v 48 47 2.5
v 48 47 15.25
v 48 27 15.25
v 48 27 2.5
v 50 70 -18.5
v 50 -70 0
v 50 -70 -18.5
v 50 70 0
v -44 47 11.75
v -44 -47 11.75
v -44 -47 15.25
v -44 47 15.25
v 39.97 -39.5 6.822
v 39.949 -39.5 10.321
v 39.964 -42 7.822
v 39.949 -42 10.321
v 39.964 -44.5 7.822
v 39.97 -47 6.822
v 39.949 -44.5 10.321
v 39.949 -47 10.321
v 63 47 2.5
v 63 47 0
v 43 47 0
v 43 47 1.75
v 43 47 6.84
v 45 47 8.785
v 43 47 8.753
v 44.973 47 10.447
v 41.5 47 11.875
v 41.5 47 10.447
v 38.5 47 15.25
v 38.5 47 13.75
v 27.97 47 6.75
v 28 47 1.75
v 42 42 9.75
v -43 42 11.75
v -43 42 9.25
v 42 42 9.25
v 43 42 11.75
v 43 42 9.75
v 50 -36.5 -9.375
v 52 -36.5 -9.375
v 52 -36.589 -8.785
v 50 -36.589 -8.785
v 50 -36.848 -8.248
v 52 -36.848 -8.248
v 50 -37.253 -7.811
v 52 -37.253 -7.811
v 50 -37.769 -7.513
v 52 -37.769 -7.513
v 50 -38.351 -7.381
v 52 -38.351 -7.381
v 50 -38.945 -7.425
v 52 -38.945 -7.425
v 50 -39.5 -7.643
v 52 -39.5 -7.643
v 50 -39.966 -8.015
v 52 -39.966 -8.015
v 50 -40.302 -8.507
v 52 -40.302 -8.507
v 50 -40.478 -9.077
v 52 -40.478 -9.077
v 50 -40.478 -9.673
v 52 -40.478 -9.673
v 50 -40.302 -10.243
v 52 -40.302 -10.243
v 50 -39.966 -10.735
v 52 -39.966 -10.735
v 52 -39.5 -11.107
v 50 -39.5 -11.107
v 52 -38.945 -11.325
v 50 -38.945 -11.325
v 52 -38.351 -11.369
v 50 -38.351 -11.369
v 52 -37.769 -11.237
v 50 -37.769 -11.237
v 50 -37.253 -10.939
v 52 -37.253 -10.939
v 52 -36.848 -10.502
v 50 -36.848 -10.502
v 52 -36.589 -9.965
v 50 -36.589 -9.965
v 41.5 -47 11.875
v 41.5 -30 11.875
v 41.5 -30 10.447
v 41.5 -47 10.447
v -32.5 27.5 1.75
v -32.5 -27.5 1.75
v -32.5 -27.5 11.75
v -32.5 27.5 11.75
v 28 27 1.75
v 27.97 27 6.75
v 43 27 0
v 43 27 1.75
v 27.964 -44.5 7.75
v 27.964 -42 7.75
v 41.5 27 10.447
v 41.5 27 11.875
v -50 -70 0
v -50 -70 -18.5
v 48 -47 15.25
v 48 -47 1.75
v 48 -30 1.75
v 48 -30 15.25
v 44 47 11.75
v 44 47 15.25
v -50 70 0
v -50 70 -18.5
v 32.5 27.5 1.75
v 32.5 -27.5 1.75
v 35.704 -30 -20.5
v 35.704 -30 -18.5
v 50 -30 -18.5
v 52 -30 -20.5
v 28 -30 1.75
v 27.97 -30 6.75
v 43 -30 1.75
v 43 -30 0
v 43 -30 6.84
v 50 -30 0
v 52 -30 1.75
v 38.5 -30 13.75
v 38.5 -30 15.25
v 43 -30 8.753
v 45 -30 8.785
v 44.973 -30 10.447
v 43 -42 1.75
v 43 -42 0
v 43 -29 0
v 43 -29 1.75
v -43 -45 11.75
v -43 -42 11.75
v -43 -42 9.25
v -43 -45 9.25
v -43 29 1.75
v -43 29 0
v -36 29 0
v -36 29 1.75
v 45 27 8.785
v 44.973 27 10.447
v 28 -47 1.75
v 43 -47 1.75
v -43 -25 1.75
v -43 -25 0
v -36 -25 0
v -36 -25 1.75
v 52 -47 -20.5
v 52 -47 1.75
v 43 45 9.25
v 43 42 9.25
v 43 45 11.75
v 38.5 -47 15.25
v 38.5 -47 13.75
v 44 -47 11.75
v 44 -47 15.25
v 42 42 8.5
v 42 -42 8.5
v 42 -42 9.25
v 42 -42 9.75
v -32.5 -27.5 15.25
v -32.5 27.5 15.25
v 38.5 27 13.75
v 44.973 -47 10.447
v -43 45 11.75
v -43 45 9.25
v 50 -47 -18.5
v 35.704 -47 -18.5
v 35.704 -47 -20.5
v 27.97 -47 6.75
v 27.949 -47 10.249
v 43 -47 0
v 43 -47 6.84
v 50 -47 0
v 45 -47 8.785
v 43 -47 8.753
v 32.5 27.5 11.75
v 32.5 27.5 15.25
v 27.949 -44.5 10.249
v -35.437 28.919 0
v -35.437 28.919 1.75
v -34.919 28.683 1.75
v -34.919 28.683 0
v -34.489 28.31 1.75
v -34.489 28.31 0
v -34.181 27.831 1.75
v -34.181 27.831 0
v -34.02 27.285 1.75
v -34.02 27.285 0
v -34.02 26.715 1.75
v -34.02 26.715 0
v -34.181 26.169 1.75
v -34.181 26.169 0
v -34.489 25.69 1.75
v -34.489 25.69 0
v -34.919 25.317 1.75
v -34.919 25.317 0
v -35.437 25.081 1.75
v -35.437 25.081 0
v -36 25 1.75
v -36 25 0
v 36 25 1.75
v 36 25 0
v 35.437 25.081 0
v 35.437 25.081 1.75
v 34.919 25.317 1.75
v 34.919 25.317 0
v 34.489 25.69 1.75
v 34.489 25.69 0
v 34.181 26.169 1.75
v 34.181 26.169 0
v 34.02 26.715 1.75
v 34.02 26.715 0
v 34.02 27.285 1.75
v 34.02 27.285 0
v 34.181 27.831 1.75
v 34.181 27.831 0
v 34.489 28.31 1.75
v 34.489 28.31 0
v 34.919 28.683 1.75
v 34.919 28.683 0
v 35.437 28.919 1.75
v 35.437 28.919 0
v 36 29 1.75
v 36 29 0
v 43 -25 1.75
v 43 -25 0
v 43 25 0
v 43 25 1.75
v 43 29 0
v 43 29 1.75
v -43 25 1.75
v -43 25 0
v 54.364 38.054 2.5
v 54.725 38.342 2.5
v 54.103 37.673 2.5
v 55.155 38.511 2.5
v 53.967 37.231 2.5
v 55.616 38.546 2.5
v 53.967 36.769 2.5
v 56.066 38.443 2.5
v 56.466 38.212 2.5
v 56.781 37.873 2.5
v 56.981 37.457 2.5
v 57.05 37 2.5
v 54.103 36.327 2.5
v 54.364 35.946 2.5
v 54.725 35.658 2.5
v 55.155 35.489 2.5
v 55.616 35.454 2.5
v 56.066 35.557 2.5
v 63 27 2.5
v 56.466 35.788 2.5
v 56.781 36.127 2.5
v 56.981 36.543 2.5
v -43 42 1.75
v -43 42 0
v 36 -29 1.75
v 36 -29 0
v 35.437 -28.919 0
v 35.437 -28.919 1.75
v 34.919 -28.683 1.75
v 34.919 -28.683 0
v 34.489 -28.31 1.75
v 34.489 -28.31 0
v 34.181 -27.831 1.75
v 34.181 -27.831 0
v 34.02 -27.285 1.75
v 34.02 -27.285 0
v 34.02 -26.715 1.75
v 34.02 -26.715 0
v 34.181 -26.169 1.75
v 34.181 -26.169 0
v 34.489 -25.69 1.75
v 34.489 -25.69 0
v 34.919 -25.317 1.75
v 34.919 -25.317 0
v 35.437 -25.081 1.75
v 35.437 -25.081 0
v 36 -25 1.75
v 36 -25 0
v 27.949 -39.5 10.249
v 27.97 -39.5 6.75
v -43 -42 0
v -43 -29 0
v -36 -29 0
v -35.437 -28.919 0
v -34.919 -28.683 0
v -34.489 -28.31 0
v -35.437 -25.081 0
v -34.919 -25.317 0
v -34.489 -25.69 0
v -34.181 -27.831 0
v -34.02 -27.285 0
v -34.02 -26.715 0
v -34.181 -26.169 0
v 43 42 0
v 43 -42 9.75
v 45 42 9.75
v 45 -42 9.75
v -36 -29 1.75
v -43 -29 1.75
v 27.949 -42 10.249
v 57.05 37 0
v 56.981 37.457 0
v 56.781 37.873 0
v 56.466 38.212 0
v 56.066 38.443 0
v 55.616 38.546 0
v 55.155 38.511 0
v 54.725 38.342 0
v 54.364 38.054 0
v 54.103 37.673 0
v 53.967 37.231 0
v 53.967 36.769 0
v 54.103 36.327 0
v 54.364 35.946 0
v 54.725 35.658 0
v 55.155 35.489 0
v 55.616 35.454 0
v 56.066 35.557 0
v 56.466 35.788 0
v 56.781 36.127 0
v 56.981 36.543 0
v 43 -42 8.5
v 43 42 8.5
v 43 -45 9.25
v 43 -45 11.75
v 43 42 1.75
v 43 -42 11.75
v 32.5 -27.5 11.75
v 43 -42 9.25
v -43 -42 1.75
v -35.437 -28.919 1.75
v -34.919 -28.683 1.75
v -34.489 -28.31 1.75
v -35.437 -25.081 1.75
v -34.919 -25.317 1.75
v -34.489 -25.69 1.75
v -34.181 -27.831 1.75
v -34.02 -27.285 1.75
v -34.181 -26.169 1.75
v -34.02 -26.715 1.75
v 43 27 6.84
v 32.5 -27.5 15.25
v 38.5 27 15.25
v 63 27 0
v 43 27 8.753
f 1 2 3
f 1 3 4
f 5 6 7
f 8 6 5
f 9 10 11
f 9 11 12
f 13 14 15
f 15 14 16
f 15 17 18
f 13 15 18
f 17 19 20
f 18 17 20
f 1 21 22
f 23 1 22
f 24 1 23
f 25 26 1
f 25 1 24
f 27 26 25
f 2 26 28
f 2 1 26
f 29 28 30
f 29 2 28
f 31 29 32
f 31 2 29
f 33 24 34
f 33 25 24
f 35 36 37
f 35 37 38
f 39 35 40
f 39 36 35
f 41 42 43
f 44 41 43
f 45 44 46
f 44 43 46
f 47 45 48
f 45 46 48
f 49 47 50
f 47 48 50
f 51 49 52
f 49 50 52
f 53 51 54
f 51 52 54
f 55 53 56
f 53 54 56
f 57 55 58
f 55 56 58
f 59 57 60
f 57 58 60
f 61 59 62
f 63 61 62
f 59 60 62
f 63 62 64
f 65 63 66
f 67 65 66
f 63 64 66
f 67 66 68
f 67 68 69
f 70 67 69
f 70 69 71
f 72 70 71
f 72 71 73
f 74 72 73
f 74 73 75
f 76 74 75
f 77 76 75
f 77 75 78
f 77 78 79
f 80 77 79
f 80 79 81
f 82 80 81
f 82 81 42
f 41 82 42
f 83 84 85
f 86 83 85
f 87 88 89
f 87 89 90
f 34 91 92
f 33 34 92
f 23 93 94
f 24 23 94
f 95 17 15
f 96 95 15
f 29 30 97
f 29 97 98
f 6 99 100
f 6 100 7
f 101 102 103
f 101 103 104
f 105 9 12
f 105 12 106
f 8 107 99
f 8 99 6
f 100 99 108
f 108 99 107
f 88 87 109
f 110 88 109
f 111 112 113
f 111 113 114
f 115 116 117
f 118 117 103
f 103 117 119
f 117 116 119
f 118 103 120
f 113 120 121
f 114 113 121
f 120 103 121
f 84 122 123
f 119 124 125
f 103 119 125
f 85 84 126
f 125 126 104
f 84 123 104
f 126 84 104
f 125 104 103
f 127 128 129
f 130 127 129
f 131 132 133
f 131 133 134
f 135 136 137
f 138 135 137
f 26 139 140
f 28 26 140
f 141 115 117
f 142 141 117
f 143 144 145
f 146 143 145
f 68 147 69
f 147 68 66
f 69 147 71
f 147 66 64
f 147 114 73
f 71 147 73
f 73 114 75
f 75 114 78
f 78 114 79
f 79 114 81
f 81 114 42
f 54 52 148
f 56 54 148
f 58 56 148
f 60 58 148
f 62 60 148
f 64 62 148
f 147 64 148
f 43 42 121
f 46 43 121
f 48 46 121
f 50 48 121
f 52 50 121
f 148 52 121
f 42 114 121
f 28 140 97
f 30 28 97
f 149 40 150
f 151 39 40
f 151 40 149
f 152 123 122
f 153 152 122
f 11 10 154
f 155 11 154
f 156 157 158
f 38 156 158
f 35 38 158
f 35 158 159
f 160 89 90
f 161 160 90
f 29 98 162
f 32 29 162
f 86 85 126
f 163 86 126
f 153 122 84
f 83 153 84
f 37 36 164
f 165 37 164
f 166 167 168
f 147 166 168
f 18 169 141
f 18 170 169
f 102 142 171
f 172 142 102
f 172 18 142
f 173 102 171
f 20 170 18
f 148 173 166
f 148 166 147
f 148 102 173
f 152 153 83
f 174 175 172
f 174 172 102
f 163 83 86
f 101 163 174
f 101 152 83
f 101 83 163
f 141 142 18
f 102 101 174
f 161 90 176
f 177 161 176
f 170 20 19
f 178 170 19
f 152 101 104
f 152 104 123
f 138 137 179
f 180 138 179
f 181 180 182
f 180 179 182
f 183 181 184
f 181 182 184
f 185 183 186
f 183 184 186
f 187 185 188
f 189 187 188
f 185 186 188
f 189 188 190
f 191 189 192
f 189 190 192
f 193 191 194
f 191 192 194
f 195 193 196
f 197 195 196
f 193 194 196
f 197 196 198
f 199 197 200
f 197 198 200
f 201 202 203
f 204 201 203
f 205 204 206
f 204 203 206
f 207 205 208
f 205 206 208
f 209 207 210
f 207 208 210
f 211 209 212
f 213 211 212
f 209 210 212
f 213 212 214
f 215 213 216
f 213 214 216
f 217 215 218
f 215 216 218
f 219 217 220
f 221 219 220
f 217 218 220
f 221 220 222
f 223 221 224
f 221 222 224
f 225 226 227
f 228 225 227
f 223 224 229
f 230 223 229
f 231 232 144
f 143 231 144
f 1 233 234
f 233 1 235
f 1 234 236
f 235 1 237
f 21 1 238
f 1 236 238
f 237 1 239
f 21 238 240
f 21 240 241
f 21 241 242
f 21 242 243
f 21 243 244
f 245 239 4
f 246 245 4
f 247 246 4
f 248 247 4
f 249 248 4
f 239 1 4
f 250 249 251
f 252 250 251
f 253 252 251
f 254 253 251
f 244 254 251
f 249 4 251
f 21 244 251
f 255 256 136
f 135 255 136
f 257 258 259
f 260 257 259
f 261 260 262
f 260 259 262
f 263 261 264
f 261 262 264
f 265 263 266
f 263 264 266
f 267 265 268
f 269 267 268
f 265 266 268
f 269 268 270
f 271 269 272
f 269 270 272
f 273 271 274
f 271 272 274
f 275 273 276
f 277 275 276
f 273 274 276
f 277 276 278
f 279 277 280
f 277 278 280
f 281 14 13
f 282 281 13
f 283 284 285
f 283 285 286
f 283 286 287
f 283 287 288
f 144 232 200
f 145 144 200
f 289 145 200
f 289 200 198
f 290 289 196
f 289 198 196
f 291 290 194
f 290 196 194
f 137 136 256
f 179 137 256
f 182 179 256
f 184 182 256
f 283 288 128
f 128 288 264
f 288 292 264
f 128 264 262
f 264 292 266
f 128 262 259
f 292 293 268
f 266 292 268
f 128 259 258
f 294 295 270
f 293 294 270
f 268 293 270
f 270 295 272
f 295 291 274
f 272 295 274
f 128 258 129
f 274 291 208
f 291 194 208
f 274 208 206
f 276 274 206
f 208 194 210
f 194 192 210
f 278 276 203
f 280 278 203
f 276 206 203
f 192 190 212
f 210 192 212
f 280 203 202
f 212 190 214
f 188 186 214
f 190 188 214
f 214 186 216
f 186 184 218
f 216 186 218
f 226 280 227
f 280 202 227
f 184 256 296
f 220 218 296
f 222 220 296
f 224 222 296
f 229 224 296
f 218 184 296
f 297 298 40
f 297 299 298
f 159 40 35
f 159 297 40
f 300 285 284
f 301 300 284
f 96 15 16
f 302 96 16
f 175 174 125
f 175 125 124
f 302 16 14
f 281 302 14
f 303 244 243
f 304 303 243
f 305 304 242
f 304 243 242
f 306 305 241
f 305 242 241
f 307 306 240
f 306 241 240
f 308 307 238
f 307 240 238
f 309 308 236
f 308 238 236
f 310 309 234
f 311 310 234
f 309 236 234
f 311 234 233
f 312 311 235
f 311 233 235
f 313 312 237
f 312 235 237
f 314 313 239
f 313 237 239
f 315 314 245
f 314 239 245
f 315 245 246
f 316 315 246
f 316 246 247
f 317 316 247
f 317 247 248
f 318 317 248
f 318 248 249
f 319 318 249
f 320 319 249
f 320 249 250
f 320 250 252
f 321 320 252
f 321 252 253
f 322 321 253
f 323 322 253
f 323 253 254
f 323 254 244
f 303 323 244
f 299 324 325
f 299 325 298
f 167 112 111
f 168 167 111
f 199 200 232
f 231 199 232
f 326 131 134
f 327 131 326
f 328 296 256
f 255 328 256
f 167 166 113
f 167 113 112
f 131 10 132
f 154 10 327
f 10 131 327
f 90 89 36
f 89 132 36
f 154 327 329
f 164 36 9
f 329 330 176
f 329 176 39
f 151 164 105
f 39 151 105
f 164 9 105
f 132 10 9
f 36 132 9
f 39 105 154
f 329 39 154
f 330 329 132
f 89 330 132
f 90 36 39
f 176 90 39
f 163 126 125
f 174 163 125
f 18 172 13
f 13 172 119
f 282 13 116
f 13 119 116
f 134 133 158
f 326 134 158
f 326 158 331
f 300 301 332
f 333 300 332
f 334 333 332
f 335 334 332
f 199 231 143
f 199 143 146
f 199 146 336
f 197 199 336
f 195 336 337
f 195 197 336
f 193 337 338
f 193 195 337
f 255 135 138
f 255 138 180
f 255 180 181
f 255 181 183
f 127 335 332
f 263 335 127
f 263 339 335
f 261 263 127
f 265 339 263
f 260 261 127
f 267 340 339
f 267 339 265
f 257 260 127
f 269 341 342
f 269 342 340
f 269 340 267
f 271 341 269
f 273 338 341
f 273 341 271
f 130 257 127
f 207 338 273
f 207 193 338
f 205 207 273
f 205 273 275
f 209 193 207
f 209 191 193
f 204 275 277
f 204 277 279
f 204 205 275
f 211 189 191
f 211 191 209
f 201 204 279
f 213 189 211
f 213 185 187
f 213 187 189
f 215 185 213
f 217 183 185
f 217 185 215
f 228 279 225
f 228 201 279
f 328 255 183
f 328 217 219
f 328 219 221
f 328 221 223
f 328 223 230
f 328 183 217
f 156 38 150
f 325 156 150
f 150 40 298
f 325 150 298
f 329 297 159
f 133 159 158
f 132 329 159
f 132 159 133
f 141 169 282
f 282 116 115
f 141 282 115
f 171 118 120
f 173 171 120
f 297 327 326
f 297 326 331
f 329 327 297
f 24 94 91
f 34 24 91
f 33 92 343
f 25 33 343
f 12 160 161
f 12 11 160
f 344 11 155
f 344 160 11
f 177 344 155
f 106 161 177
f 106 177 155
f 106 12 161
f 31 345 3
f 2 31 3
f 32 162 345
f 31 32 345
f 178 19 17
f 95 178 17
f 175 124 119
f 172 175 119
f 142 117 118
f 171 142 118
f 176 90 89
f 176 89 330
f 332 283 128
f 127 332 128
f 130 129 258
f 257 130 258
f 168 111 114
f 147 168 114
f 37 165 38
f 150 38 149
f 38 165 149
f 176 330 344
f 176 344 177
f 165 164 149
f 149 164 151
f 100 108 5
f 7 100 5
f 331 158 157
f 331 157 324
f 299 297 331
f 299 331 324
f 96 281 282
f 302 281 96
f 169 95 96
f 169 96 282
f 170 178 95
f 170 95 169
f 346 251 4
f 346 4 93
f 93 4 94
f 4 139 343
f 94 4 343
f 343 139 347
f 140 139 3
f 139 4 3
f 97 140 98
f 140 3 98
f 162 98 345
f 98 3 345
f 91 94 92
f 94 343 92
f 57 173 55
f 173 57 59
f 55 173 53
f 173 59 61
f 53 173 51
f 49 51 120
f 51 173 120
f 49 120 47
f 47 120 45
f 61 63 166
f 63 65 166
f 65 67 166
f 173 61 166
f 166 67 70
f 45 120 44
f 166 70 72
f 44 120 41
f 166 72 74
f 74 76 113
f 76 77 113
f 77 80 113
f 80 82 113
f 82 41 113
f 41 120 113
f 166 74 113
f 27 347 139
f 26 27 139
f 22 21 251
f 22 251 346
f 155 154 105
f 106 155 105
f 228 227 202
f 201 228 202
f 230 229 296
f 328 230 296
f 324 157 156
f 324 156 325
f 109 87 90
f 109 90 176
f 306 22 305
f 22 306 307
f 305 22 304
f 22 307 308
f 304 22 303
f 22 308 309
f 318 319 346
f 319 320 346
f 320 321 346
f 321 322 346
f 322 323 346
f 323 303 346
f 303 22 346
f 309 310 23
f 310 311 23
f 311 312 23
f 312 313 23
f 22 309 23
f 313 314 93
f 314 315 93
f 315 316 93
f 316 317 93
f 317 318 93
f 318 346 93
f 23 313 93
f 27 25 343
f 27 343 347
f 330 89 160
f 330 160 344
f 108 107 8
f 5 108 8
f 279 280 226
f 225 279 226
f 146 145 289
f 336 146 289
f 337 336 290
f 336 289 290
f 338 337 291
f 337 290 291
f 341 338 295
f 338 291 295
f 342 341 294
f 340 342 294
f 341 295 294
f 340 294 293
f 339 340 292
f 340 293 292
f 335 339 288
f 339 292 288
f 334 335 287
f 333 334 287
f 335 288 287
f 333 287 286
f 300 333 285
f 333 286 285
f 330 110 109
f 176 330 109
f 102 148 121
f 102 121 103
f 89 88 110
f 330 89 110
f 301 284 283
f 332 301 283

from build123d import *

# Parameters (mm, degrees)
F0_W           = 100
F0_H           = 140
F1_DEPTH       = 18.5
F3_DEPTH       = 1.75
F4_W           = 65
F4_H           = 55
F5_DEPTH       = 10
F6_W           = 88
F6_H           = 94
F6_W_2         = 86
F6_H_2         = 84
F6_W_3         = 65
F6_H_3         = 55
F6_H_4         = 3
F7_DEPTH       = 3.5
F8_DEPTH       = 2.5
F9_W           = 1
F9_H           = 1.25
F10_DEPTH      = 42
F10_DEPTH_BACK = 42
F12_DEPTH      = 47
F13_DEPTH      = 30
F15_DEPTH      = 12
F16_R          = 2
F17_DEPTH      = 3
F20_DEPTH      = 20
F21_R          = 1.55
F22_DEPTH      = 25


with BuildPart() as f1:
    # F0 (on Top) → F1 (new body)
    with BuildSketch(Plane.XY):
        Rectangle(F0_W, F0_H)
    extrude(amount=-F1_DEPTH)


with BuildPart() as f3:
    # F2 (on Top) → F3 (new body)
    with BuildSketch(Plane.XY):
        with BuildLine():
            Line((43, 42), (-43, 42))
            Line((-43, 42), (-43, 29))
            Line((-43, 29), (-36, 29))
            ThreePointArc((-36, 29), (-34, 27), (-36, 25))
            Line((-36, 25), (-43, 25))
            Line((-43, 25), (-43, -25))
            Line((-43, -25), (-36, -25))
            ThreePointArc((-36, -25), (-34, -27), (-36, -29))
            Line((-36, -29), (-43, -29))
            Line((-43, -29), (-43, -42))
            Line((-43, -42), (43, -42))
            Line((43, -42), (43, -29))
            Line((43, -29), (36, -29))
            ThreePointArc((36, -29), (34, -27), (36, -25))
            Line((36, -25), (43, -25))
            Line((43, -25), (43, 25))
            Line((43, 25), (36, 25))
            ThreePointArc((36, 25), (34, 27), (36, 29))
            Line((36, 29), (43, 29))
            Line((43, 29), (43, 42))
        make_face()
    extrude(amount=F3_DEPTH)


with BuildPart() as f5:
    # F4 (on face) → F5 (new body)
    with BuildSketch(Plane.XY.offset(1.75)):
        Rectangle(F4_W, F4_H)
    extrude(amount=F5_DEPTH)


with BuildPart() as f7:
    # F6 (on face) → F7 (new body)
    with BuildSketch(Plane.XY.offset(11.75)):
        Rectangle(F6_W, F6_H)
        Polygon((-43, 42), (-43, 45), (43, 45), (43, 42), (43, -42), (43, -44), (43, -45), (-43, -45), (-43, -44), (-43, -42), align=None, mode=Mode.SUBTRACT)
        Rectangle(F6_W_2, F6_H_2)
        Rectangle(F6_W_3, F6_H_3, mode=Mode.SUBTRACT)
        with Locations((0, 43.5)):
            Rectangle(F6_W_2, F6_H_4)
        Polygon((43, -42), (-43, -42), (-43, -44), (-43, -45), (43, -45), (43, -44), align=None)
    extrude(amount=F7_DEPTH)

    # F6 (on face) → F8 (join)
    with BuildSketch(Plane.XY.offset(11.75)):
        with Locations((0, 43.5)):
            Rectangle(F6_W_2, F6_H_4)
        Polygon((43, -42), (-43, -42), (-43, -44), (-43, -45), (43, -45), (43, -44), align=None)
    extrude(amount=-F8_DEPTH)

    # F9 (on Front) → F10 (join, two sides)
    with BuildSketch(Plane.XZ) as f10_sk:
        with Locations((42.5, 9.125)):
            Rectangle(F9_W, F9_H)
        Polygon((43, 9.75), (43, 8.5), (45, 9.75), align=None)
    extrude(amount=F10_DEPTH)
    extrude(f10_sk.sketch, amount=-F10_DEPTH_BACK)


with BuildPart() as f12:
    # F11 (on Front) → F12 (new body)
    with BuildSketch(Plane.XZ):
        Polygon((27.9699712028, 6.7499098263), (28, 1.75), (43, 1.75), (43, 0), (48, 0), (50, 0), (52, 0), (52, 1.75), (48, 1.75), (48, 13.75), (48, 15.25), (38.5, 15.25), (38.5, 13.75), (41.5, 11.875), (41.5, 10.4472711682), (44.9731051922, 10.4472711682), (45, 8.7854899466), (43, 8.7531212961), (43, 6.8401781918), align=None)
        Polygon((52, 0), (50, 0), (50, -18.5), (35.7036739588, -18.5), (35.7036739588, -20.5), (52, -20.5), align=None)
    extrude(amount=F12_DEPTH)

    # F11 (on Front) → F13 (cut)
    with BuildSketch(Plane.XZ):
        Polygon((27.9699712028, 6.7499098263), (28, 1.75), (43, 1.75), (43, 0), (48, 0), (50, 0), (52, 0), (52, 1.75), (48, 1.75), (48, 13.75), (48, 15.25), (38.5, 15.25), (38.5, 13.75), (41.5, 11.875), (41.5, 10.4472711682), (44.9731051922, 10.4472711682), (45, 8.7854899466), (43, 8.7531212961), (43, 6.8401781918), align=None)
        Polygon((52, 0), (50, 0), (50, -18.5), (35.7036739588, -18.5), (35.7036739588, -20.5), (52, -20.5), align=None)
    extrude(amount=F13_DEPTH, mode=Mode.SUBTRACT)

    # F14 (on face) → F15 (join)
    with BuildSketch(Plane(origin=(28.0094999534, 0, 0.1682213529), x_dir=(0, -1, 0), z_dir=(-0.9999819653, 0, -0.0060057594))):
        Polygon((39.5, 5.9370710514), (47, 5.9370710514), (47, 7.0816674463), (47, 10.0810629427), (44.5, 10.0810629427), (44.5, 7.5816674463), (42, 7.5816674463), (42, 9.5810629427), (42, 10.0810629427), (39.5, 10.0810629427), (39.5, 9.5810629427), align=None)
    extrude(amount=-F15_DEPTH)

    # F16 (on face) → F17 (cut)
    with BuildSketch(Plane.YZ.offset(52)):
        with Locations((-38.5, -9.375)):
            Circle(F16_R)
    extrude(amount=-F17_DEPTH, mode=Mode.SUBTRACT)


with BuildPart() as f20:
    # F19 (on offset) → F20 (new body)
    with BuildSketch(Plane(origin=(0, 27, 0), x_dir=(-1, 0, 0), z_dir=(0, 1, 0))):
        Polygon((-43, 1.75), (-28, 1.75), (-27.9699712028, 6.7499098263), (-43, 6.8401781918), (-43, 8.7531212961), (-45, 8.7854899466), (-44.9731051922, 10.4472711682), (-41.5, 10.4472711682), (-41.5, 11.875), (-38.5, 13.75), (-38.5, 15.25), (-48, 15.25), (-48, 2.5), (-63, 2.5), (-63, 0), (-43, 0), align=None)
    extrude(amount=F20_DEPTH)

    # F21 (on face) → F22 (cut)
    with BuildSketch(Plane.XY.offset(2.5)):
        with Locations((55.5, 37)):
            Circle(F21_R)
    extrude(amount=-F22_DEPTH, mode=Mode.SUBTRACT)


solid = Compound([f1.part, f3.part, f5.part, f7.part, f12.part, f20.part])
